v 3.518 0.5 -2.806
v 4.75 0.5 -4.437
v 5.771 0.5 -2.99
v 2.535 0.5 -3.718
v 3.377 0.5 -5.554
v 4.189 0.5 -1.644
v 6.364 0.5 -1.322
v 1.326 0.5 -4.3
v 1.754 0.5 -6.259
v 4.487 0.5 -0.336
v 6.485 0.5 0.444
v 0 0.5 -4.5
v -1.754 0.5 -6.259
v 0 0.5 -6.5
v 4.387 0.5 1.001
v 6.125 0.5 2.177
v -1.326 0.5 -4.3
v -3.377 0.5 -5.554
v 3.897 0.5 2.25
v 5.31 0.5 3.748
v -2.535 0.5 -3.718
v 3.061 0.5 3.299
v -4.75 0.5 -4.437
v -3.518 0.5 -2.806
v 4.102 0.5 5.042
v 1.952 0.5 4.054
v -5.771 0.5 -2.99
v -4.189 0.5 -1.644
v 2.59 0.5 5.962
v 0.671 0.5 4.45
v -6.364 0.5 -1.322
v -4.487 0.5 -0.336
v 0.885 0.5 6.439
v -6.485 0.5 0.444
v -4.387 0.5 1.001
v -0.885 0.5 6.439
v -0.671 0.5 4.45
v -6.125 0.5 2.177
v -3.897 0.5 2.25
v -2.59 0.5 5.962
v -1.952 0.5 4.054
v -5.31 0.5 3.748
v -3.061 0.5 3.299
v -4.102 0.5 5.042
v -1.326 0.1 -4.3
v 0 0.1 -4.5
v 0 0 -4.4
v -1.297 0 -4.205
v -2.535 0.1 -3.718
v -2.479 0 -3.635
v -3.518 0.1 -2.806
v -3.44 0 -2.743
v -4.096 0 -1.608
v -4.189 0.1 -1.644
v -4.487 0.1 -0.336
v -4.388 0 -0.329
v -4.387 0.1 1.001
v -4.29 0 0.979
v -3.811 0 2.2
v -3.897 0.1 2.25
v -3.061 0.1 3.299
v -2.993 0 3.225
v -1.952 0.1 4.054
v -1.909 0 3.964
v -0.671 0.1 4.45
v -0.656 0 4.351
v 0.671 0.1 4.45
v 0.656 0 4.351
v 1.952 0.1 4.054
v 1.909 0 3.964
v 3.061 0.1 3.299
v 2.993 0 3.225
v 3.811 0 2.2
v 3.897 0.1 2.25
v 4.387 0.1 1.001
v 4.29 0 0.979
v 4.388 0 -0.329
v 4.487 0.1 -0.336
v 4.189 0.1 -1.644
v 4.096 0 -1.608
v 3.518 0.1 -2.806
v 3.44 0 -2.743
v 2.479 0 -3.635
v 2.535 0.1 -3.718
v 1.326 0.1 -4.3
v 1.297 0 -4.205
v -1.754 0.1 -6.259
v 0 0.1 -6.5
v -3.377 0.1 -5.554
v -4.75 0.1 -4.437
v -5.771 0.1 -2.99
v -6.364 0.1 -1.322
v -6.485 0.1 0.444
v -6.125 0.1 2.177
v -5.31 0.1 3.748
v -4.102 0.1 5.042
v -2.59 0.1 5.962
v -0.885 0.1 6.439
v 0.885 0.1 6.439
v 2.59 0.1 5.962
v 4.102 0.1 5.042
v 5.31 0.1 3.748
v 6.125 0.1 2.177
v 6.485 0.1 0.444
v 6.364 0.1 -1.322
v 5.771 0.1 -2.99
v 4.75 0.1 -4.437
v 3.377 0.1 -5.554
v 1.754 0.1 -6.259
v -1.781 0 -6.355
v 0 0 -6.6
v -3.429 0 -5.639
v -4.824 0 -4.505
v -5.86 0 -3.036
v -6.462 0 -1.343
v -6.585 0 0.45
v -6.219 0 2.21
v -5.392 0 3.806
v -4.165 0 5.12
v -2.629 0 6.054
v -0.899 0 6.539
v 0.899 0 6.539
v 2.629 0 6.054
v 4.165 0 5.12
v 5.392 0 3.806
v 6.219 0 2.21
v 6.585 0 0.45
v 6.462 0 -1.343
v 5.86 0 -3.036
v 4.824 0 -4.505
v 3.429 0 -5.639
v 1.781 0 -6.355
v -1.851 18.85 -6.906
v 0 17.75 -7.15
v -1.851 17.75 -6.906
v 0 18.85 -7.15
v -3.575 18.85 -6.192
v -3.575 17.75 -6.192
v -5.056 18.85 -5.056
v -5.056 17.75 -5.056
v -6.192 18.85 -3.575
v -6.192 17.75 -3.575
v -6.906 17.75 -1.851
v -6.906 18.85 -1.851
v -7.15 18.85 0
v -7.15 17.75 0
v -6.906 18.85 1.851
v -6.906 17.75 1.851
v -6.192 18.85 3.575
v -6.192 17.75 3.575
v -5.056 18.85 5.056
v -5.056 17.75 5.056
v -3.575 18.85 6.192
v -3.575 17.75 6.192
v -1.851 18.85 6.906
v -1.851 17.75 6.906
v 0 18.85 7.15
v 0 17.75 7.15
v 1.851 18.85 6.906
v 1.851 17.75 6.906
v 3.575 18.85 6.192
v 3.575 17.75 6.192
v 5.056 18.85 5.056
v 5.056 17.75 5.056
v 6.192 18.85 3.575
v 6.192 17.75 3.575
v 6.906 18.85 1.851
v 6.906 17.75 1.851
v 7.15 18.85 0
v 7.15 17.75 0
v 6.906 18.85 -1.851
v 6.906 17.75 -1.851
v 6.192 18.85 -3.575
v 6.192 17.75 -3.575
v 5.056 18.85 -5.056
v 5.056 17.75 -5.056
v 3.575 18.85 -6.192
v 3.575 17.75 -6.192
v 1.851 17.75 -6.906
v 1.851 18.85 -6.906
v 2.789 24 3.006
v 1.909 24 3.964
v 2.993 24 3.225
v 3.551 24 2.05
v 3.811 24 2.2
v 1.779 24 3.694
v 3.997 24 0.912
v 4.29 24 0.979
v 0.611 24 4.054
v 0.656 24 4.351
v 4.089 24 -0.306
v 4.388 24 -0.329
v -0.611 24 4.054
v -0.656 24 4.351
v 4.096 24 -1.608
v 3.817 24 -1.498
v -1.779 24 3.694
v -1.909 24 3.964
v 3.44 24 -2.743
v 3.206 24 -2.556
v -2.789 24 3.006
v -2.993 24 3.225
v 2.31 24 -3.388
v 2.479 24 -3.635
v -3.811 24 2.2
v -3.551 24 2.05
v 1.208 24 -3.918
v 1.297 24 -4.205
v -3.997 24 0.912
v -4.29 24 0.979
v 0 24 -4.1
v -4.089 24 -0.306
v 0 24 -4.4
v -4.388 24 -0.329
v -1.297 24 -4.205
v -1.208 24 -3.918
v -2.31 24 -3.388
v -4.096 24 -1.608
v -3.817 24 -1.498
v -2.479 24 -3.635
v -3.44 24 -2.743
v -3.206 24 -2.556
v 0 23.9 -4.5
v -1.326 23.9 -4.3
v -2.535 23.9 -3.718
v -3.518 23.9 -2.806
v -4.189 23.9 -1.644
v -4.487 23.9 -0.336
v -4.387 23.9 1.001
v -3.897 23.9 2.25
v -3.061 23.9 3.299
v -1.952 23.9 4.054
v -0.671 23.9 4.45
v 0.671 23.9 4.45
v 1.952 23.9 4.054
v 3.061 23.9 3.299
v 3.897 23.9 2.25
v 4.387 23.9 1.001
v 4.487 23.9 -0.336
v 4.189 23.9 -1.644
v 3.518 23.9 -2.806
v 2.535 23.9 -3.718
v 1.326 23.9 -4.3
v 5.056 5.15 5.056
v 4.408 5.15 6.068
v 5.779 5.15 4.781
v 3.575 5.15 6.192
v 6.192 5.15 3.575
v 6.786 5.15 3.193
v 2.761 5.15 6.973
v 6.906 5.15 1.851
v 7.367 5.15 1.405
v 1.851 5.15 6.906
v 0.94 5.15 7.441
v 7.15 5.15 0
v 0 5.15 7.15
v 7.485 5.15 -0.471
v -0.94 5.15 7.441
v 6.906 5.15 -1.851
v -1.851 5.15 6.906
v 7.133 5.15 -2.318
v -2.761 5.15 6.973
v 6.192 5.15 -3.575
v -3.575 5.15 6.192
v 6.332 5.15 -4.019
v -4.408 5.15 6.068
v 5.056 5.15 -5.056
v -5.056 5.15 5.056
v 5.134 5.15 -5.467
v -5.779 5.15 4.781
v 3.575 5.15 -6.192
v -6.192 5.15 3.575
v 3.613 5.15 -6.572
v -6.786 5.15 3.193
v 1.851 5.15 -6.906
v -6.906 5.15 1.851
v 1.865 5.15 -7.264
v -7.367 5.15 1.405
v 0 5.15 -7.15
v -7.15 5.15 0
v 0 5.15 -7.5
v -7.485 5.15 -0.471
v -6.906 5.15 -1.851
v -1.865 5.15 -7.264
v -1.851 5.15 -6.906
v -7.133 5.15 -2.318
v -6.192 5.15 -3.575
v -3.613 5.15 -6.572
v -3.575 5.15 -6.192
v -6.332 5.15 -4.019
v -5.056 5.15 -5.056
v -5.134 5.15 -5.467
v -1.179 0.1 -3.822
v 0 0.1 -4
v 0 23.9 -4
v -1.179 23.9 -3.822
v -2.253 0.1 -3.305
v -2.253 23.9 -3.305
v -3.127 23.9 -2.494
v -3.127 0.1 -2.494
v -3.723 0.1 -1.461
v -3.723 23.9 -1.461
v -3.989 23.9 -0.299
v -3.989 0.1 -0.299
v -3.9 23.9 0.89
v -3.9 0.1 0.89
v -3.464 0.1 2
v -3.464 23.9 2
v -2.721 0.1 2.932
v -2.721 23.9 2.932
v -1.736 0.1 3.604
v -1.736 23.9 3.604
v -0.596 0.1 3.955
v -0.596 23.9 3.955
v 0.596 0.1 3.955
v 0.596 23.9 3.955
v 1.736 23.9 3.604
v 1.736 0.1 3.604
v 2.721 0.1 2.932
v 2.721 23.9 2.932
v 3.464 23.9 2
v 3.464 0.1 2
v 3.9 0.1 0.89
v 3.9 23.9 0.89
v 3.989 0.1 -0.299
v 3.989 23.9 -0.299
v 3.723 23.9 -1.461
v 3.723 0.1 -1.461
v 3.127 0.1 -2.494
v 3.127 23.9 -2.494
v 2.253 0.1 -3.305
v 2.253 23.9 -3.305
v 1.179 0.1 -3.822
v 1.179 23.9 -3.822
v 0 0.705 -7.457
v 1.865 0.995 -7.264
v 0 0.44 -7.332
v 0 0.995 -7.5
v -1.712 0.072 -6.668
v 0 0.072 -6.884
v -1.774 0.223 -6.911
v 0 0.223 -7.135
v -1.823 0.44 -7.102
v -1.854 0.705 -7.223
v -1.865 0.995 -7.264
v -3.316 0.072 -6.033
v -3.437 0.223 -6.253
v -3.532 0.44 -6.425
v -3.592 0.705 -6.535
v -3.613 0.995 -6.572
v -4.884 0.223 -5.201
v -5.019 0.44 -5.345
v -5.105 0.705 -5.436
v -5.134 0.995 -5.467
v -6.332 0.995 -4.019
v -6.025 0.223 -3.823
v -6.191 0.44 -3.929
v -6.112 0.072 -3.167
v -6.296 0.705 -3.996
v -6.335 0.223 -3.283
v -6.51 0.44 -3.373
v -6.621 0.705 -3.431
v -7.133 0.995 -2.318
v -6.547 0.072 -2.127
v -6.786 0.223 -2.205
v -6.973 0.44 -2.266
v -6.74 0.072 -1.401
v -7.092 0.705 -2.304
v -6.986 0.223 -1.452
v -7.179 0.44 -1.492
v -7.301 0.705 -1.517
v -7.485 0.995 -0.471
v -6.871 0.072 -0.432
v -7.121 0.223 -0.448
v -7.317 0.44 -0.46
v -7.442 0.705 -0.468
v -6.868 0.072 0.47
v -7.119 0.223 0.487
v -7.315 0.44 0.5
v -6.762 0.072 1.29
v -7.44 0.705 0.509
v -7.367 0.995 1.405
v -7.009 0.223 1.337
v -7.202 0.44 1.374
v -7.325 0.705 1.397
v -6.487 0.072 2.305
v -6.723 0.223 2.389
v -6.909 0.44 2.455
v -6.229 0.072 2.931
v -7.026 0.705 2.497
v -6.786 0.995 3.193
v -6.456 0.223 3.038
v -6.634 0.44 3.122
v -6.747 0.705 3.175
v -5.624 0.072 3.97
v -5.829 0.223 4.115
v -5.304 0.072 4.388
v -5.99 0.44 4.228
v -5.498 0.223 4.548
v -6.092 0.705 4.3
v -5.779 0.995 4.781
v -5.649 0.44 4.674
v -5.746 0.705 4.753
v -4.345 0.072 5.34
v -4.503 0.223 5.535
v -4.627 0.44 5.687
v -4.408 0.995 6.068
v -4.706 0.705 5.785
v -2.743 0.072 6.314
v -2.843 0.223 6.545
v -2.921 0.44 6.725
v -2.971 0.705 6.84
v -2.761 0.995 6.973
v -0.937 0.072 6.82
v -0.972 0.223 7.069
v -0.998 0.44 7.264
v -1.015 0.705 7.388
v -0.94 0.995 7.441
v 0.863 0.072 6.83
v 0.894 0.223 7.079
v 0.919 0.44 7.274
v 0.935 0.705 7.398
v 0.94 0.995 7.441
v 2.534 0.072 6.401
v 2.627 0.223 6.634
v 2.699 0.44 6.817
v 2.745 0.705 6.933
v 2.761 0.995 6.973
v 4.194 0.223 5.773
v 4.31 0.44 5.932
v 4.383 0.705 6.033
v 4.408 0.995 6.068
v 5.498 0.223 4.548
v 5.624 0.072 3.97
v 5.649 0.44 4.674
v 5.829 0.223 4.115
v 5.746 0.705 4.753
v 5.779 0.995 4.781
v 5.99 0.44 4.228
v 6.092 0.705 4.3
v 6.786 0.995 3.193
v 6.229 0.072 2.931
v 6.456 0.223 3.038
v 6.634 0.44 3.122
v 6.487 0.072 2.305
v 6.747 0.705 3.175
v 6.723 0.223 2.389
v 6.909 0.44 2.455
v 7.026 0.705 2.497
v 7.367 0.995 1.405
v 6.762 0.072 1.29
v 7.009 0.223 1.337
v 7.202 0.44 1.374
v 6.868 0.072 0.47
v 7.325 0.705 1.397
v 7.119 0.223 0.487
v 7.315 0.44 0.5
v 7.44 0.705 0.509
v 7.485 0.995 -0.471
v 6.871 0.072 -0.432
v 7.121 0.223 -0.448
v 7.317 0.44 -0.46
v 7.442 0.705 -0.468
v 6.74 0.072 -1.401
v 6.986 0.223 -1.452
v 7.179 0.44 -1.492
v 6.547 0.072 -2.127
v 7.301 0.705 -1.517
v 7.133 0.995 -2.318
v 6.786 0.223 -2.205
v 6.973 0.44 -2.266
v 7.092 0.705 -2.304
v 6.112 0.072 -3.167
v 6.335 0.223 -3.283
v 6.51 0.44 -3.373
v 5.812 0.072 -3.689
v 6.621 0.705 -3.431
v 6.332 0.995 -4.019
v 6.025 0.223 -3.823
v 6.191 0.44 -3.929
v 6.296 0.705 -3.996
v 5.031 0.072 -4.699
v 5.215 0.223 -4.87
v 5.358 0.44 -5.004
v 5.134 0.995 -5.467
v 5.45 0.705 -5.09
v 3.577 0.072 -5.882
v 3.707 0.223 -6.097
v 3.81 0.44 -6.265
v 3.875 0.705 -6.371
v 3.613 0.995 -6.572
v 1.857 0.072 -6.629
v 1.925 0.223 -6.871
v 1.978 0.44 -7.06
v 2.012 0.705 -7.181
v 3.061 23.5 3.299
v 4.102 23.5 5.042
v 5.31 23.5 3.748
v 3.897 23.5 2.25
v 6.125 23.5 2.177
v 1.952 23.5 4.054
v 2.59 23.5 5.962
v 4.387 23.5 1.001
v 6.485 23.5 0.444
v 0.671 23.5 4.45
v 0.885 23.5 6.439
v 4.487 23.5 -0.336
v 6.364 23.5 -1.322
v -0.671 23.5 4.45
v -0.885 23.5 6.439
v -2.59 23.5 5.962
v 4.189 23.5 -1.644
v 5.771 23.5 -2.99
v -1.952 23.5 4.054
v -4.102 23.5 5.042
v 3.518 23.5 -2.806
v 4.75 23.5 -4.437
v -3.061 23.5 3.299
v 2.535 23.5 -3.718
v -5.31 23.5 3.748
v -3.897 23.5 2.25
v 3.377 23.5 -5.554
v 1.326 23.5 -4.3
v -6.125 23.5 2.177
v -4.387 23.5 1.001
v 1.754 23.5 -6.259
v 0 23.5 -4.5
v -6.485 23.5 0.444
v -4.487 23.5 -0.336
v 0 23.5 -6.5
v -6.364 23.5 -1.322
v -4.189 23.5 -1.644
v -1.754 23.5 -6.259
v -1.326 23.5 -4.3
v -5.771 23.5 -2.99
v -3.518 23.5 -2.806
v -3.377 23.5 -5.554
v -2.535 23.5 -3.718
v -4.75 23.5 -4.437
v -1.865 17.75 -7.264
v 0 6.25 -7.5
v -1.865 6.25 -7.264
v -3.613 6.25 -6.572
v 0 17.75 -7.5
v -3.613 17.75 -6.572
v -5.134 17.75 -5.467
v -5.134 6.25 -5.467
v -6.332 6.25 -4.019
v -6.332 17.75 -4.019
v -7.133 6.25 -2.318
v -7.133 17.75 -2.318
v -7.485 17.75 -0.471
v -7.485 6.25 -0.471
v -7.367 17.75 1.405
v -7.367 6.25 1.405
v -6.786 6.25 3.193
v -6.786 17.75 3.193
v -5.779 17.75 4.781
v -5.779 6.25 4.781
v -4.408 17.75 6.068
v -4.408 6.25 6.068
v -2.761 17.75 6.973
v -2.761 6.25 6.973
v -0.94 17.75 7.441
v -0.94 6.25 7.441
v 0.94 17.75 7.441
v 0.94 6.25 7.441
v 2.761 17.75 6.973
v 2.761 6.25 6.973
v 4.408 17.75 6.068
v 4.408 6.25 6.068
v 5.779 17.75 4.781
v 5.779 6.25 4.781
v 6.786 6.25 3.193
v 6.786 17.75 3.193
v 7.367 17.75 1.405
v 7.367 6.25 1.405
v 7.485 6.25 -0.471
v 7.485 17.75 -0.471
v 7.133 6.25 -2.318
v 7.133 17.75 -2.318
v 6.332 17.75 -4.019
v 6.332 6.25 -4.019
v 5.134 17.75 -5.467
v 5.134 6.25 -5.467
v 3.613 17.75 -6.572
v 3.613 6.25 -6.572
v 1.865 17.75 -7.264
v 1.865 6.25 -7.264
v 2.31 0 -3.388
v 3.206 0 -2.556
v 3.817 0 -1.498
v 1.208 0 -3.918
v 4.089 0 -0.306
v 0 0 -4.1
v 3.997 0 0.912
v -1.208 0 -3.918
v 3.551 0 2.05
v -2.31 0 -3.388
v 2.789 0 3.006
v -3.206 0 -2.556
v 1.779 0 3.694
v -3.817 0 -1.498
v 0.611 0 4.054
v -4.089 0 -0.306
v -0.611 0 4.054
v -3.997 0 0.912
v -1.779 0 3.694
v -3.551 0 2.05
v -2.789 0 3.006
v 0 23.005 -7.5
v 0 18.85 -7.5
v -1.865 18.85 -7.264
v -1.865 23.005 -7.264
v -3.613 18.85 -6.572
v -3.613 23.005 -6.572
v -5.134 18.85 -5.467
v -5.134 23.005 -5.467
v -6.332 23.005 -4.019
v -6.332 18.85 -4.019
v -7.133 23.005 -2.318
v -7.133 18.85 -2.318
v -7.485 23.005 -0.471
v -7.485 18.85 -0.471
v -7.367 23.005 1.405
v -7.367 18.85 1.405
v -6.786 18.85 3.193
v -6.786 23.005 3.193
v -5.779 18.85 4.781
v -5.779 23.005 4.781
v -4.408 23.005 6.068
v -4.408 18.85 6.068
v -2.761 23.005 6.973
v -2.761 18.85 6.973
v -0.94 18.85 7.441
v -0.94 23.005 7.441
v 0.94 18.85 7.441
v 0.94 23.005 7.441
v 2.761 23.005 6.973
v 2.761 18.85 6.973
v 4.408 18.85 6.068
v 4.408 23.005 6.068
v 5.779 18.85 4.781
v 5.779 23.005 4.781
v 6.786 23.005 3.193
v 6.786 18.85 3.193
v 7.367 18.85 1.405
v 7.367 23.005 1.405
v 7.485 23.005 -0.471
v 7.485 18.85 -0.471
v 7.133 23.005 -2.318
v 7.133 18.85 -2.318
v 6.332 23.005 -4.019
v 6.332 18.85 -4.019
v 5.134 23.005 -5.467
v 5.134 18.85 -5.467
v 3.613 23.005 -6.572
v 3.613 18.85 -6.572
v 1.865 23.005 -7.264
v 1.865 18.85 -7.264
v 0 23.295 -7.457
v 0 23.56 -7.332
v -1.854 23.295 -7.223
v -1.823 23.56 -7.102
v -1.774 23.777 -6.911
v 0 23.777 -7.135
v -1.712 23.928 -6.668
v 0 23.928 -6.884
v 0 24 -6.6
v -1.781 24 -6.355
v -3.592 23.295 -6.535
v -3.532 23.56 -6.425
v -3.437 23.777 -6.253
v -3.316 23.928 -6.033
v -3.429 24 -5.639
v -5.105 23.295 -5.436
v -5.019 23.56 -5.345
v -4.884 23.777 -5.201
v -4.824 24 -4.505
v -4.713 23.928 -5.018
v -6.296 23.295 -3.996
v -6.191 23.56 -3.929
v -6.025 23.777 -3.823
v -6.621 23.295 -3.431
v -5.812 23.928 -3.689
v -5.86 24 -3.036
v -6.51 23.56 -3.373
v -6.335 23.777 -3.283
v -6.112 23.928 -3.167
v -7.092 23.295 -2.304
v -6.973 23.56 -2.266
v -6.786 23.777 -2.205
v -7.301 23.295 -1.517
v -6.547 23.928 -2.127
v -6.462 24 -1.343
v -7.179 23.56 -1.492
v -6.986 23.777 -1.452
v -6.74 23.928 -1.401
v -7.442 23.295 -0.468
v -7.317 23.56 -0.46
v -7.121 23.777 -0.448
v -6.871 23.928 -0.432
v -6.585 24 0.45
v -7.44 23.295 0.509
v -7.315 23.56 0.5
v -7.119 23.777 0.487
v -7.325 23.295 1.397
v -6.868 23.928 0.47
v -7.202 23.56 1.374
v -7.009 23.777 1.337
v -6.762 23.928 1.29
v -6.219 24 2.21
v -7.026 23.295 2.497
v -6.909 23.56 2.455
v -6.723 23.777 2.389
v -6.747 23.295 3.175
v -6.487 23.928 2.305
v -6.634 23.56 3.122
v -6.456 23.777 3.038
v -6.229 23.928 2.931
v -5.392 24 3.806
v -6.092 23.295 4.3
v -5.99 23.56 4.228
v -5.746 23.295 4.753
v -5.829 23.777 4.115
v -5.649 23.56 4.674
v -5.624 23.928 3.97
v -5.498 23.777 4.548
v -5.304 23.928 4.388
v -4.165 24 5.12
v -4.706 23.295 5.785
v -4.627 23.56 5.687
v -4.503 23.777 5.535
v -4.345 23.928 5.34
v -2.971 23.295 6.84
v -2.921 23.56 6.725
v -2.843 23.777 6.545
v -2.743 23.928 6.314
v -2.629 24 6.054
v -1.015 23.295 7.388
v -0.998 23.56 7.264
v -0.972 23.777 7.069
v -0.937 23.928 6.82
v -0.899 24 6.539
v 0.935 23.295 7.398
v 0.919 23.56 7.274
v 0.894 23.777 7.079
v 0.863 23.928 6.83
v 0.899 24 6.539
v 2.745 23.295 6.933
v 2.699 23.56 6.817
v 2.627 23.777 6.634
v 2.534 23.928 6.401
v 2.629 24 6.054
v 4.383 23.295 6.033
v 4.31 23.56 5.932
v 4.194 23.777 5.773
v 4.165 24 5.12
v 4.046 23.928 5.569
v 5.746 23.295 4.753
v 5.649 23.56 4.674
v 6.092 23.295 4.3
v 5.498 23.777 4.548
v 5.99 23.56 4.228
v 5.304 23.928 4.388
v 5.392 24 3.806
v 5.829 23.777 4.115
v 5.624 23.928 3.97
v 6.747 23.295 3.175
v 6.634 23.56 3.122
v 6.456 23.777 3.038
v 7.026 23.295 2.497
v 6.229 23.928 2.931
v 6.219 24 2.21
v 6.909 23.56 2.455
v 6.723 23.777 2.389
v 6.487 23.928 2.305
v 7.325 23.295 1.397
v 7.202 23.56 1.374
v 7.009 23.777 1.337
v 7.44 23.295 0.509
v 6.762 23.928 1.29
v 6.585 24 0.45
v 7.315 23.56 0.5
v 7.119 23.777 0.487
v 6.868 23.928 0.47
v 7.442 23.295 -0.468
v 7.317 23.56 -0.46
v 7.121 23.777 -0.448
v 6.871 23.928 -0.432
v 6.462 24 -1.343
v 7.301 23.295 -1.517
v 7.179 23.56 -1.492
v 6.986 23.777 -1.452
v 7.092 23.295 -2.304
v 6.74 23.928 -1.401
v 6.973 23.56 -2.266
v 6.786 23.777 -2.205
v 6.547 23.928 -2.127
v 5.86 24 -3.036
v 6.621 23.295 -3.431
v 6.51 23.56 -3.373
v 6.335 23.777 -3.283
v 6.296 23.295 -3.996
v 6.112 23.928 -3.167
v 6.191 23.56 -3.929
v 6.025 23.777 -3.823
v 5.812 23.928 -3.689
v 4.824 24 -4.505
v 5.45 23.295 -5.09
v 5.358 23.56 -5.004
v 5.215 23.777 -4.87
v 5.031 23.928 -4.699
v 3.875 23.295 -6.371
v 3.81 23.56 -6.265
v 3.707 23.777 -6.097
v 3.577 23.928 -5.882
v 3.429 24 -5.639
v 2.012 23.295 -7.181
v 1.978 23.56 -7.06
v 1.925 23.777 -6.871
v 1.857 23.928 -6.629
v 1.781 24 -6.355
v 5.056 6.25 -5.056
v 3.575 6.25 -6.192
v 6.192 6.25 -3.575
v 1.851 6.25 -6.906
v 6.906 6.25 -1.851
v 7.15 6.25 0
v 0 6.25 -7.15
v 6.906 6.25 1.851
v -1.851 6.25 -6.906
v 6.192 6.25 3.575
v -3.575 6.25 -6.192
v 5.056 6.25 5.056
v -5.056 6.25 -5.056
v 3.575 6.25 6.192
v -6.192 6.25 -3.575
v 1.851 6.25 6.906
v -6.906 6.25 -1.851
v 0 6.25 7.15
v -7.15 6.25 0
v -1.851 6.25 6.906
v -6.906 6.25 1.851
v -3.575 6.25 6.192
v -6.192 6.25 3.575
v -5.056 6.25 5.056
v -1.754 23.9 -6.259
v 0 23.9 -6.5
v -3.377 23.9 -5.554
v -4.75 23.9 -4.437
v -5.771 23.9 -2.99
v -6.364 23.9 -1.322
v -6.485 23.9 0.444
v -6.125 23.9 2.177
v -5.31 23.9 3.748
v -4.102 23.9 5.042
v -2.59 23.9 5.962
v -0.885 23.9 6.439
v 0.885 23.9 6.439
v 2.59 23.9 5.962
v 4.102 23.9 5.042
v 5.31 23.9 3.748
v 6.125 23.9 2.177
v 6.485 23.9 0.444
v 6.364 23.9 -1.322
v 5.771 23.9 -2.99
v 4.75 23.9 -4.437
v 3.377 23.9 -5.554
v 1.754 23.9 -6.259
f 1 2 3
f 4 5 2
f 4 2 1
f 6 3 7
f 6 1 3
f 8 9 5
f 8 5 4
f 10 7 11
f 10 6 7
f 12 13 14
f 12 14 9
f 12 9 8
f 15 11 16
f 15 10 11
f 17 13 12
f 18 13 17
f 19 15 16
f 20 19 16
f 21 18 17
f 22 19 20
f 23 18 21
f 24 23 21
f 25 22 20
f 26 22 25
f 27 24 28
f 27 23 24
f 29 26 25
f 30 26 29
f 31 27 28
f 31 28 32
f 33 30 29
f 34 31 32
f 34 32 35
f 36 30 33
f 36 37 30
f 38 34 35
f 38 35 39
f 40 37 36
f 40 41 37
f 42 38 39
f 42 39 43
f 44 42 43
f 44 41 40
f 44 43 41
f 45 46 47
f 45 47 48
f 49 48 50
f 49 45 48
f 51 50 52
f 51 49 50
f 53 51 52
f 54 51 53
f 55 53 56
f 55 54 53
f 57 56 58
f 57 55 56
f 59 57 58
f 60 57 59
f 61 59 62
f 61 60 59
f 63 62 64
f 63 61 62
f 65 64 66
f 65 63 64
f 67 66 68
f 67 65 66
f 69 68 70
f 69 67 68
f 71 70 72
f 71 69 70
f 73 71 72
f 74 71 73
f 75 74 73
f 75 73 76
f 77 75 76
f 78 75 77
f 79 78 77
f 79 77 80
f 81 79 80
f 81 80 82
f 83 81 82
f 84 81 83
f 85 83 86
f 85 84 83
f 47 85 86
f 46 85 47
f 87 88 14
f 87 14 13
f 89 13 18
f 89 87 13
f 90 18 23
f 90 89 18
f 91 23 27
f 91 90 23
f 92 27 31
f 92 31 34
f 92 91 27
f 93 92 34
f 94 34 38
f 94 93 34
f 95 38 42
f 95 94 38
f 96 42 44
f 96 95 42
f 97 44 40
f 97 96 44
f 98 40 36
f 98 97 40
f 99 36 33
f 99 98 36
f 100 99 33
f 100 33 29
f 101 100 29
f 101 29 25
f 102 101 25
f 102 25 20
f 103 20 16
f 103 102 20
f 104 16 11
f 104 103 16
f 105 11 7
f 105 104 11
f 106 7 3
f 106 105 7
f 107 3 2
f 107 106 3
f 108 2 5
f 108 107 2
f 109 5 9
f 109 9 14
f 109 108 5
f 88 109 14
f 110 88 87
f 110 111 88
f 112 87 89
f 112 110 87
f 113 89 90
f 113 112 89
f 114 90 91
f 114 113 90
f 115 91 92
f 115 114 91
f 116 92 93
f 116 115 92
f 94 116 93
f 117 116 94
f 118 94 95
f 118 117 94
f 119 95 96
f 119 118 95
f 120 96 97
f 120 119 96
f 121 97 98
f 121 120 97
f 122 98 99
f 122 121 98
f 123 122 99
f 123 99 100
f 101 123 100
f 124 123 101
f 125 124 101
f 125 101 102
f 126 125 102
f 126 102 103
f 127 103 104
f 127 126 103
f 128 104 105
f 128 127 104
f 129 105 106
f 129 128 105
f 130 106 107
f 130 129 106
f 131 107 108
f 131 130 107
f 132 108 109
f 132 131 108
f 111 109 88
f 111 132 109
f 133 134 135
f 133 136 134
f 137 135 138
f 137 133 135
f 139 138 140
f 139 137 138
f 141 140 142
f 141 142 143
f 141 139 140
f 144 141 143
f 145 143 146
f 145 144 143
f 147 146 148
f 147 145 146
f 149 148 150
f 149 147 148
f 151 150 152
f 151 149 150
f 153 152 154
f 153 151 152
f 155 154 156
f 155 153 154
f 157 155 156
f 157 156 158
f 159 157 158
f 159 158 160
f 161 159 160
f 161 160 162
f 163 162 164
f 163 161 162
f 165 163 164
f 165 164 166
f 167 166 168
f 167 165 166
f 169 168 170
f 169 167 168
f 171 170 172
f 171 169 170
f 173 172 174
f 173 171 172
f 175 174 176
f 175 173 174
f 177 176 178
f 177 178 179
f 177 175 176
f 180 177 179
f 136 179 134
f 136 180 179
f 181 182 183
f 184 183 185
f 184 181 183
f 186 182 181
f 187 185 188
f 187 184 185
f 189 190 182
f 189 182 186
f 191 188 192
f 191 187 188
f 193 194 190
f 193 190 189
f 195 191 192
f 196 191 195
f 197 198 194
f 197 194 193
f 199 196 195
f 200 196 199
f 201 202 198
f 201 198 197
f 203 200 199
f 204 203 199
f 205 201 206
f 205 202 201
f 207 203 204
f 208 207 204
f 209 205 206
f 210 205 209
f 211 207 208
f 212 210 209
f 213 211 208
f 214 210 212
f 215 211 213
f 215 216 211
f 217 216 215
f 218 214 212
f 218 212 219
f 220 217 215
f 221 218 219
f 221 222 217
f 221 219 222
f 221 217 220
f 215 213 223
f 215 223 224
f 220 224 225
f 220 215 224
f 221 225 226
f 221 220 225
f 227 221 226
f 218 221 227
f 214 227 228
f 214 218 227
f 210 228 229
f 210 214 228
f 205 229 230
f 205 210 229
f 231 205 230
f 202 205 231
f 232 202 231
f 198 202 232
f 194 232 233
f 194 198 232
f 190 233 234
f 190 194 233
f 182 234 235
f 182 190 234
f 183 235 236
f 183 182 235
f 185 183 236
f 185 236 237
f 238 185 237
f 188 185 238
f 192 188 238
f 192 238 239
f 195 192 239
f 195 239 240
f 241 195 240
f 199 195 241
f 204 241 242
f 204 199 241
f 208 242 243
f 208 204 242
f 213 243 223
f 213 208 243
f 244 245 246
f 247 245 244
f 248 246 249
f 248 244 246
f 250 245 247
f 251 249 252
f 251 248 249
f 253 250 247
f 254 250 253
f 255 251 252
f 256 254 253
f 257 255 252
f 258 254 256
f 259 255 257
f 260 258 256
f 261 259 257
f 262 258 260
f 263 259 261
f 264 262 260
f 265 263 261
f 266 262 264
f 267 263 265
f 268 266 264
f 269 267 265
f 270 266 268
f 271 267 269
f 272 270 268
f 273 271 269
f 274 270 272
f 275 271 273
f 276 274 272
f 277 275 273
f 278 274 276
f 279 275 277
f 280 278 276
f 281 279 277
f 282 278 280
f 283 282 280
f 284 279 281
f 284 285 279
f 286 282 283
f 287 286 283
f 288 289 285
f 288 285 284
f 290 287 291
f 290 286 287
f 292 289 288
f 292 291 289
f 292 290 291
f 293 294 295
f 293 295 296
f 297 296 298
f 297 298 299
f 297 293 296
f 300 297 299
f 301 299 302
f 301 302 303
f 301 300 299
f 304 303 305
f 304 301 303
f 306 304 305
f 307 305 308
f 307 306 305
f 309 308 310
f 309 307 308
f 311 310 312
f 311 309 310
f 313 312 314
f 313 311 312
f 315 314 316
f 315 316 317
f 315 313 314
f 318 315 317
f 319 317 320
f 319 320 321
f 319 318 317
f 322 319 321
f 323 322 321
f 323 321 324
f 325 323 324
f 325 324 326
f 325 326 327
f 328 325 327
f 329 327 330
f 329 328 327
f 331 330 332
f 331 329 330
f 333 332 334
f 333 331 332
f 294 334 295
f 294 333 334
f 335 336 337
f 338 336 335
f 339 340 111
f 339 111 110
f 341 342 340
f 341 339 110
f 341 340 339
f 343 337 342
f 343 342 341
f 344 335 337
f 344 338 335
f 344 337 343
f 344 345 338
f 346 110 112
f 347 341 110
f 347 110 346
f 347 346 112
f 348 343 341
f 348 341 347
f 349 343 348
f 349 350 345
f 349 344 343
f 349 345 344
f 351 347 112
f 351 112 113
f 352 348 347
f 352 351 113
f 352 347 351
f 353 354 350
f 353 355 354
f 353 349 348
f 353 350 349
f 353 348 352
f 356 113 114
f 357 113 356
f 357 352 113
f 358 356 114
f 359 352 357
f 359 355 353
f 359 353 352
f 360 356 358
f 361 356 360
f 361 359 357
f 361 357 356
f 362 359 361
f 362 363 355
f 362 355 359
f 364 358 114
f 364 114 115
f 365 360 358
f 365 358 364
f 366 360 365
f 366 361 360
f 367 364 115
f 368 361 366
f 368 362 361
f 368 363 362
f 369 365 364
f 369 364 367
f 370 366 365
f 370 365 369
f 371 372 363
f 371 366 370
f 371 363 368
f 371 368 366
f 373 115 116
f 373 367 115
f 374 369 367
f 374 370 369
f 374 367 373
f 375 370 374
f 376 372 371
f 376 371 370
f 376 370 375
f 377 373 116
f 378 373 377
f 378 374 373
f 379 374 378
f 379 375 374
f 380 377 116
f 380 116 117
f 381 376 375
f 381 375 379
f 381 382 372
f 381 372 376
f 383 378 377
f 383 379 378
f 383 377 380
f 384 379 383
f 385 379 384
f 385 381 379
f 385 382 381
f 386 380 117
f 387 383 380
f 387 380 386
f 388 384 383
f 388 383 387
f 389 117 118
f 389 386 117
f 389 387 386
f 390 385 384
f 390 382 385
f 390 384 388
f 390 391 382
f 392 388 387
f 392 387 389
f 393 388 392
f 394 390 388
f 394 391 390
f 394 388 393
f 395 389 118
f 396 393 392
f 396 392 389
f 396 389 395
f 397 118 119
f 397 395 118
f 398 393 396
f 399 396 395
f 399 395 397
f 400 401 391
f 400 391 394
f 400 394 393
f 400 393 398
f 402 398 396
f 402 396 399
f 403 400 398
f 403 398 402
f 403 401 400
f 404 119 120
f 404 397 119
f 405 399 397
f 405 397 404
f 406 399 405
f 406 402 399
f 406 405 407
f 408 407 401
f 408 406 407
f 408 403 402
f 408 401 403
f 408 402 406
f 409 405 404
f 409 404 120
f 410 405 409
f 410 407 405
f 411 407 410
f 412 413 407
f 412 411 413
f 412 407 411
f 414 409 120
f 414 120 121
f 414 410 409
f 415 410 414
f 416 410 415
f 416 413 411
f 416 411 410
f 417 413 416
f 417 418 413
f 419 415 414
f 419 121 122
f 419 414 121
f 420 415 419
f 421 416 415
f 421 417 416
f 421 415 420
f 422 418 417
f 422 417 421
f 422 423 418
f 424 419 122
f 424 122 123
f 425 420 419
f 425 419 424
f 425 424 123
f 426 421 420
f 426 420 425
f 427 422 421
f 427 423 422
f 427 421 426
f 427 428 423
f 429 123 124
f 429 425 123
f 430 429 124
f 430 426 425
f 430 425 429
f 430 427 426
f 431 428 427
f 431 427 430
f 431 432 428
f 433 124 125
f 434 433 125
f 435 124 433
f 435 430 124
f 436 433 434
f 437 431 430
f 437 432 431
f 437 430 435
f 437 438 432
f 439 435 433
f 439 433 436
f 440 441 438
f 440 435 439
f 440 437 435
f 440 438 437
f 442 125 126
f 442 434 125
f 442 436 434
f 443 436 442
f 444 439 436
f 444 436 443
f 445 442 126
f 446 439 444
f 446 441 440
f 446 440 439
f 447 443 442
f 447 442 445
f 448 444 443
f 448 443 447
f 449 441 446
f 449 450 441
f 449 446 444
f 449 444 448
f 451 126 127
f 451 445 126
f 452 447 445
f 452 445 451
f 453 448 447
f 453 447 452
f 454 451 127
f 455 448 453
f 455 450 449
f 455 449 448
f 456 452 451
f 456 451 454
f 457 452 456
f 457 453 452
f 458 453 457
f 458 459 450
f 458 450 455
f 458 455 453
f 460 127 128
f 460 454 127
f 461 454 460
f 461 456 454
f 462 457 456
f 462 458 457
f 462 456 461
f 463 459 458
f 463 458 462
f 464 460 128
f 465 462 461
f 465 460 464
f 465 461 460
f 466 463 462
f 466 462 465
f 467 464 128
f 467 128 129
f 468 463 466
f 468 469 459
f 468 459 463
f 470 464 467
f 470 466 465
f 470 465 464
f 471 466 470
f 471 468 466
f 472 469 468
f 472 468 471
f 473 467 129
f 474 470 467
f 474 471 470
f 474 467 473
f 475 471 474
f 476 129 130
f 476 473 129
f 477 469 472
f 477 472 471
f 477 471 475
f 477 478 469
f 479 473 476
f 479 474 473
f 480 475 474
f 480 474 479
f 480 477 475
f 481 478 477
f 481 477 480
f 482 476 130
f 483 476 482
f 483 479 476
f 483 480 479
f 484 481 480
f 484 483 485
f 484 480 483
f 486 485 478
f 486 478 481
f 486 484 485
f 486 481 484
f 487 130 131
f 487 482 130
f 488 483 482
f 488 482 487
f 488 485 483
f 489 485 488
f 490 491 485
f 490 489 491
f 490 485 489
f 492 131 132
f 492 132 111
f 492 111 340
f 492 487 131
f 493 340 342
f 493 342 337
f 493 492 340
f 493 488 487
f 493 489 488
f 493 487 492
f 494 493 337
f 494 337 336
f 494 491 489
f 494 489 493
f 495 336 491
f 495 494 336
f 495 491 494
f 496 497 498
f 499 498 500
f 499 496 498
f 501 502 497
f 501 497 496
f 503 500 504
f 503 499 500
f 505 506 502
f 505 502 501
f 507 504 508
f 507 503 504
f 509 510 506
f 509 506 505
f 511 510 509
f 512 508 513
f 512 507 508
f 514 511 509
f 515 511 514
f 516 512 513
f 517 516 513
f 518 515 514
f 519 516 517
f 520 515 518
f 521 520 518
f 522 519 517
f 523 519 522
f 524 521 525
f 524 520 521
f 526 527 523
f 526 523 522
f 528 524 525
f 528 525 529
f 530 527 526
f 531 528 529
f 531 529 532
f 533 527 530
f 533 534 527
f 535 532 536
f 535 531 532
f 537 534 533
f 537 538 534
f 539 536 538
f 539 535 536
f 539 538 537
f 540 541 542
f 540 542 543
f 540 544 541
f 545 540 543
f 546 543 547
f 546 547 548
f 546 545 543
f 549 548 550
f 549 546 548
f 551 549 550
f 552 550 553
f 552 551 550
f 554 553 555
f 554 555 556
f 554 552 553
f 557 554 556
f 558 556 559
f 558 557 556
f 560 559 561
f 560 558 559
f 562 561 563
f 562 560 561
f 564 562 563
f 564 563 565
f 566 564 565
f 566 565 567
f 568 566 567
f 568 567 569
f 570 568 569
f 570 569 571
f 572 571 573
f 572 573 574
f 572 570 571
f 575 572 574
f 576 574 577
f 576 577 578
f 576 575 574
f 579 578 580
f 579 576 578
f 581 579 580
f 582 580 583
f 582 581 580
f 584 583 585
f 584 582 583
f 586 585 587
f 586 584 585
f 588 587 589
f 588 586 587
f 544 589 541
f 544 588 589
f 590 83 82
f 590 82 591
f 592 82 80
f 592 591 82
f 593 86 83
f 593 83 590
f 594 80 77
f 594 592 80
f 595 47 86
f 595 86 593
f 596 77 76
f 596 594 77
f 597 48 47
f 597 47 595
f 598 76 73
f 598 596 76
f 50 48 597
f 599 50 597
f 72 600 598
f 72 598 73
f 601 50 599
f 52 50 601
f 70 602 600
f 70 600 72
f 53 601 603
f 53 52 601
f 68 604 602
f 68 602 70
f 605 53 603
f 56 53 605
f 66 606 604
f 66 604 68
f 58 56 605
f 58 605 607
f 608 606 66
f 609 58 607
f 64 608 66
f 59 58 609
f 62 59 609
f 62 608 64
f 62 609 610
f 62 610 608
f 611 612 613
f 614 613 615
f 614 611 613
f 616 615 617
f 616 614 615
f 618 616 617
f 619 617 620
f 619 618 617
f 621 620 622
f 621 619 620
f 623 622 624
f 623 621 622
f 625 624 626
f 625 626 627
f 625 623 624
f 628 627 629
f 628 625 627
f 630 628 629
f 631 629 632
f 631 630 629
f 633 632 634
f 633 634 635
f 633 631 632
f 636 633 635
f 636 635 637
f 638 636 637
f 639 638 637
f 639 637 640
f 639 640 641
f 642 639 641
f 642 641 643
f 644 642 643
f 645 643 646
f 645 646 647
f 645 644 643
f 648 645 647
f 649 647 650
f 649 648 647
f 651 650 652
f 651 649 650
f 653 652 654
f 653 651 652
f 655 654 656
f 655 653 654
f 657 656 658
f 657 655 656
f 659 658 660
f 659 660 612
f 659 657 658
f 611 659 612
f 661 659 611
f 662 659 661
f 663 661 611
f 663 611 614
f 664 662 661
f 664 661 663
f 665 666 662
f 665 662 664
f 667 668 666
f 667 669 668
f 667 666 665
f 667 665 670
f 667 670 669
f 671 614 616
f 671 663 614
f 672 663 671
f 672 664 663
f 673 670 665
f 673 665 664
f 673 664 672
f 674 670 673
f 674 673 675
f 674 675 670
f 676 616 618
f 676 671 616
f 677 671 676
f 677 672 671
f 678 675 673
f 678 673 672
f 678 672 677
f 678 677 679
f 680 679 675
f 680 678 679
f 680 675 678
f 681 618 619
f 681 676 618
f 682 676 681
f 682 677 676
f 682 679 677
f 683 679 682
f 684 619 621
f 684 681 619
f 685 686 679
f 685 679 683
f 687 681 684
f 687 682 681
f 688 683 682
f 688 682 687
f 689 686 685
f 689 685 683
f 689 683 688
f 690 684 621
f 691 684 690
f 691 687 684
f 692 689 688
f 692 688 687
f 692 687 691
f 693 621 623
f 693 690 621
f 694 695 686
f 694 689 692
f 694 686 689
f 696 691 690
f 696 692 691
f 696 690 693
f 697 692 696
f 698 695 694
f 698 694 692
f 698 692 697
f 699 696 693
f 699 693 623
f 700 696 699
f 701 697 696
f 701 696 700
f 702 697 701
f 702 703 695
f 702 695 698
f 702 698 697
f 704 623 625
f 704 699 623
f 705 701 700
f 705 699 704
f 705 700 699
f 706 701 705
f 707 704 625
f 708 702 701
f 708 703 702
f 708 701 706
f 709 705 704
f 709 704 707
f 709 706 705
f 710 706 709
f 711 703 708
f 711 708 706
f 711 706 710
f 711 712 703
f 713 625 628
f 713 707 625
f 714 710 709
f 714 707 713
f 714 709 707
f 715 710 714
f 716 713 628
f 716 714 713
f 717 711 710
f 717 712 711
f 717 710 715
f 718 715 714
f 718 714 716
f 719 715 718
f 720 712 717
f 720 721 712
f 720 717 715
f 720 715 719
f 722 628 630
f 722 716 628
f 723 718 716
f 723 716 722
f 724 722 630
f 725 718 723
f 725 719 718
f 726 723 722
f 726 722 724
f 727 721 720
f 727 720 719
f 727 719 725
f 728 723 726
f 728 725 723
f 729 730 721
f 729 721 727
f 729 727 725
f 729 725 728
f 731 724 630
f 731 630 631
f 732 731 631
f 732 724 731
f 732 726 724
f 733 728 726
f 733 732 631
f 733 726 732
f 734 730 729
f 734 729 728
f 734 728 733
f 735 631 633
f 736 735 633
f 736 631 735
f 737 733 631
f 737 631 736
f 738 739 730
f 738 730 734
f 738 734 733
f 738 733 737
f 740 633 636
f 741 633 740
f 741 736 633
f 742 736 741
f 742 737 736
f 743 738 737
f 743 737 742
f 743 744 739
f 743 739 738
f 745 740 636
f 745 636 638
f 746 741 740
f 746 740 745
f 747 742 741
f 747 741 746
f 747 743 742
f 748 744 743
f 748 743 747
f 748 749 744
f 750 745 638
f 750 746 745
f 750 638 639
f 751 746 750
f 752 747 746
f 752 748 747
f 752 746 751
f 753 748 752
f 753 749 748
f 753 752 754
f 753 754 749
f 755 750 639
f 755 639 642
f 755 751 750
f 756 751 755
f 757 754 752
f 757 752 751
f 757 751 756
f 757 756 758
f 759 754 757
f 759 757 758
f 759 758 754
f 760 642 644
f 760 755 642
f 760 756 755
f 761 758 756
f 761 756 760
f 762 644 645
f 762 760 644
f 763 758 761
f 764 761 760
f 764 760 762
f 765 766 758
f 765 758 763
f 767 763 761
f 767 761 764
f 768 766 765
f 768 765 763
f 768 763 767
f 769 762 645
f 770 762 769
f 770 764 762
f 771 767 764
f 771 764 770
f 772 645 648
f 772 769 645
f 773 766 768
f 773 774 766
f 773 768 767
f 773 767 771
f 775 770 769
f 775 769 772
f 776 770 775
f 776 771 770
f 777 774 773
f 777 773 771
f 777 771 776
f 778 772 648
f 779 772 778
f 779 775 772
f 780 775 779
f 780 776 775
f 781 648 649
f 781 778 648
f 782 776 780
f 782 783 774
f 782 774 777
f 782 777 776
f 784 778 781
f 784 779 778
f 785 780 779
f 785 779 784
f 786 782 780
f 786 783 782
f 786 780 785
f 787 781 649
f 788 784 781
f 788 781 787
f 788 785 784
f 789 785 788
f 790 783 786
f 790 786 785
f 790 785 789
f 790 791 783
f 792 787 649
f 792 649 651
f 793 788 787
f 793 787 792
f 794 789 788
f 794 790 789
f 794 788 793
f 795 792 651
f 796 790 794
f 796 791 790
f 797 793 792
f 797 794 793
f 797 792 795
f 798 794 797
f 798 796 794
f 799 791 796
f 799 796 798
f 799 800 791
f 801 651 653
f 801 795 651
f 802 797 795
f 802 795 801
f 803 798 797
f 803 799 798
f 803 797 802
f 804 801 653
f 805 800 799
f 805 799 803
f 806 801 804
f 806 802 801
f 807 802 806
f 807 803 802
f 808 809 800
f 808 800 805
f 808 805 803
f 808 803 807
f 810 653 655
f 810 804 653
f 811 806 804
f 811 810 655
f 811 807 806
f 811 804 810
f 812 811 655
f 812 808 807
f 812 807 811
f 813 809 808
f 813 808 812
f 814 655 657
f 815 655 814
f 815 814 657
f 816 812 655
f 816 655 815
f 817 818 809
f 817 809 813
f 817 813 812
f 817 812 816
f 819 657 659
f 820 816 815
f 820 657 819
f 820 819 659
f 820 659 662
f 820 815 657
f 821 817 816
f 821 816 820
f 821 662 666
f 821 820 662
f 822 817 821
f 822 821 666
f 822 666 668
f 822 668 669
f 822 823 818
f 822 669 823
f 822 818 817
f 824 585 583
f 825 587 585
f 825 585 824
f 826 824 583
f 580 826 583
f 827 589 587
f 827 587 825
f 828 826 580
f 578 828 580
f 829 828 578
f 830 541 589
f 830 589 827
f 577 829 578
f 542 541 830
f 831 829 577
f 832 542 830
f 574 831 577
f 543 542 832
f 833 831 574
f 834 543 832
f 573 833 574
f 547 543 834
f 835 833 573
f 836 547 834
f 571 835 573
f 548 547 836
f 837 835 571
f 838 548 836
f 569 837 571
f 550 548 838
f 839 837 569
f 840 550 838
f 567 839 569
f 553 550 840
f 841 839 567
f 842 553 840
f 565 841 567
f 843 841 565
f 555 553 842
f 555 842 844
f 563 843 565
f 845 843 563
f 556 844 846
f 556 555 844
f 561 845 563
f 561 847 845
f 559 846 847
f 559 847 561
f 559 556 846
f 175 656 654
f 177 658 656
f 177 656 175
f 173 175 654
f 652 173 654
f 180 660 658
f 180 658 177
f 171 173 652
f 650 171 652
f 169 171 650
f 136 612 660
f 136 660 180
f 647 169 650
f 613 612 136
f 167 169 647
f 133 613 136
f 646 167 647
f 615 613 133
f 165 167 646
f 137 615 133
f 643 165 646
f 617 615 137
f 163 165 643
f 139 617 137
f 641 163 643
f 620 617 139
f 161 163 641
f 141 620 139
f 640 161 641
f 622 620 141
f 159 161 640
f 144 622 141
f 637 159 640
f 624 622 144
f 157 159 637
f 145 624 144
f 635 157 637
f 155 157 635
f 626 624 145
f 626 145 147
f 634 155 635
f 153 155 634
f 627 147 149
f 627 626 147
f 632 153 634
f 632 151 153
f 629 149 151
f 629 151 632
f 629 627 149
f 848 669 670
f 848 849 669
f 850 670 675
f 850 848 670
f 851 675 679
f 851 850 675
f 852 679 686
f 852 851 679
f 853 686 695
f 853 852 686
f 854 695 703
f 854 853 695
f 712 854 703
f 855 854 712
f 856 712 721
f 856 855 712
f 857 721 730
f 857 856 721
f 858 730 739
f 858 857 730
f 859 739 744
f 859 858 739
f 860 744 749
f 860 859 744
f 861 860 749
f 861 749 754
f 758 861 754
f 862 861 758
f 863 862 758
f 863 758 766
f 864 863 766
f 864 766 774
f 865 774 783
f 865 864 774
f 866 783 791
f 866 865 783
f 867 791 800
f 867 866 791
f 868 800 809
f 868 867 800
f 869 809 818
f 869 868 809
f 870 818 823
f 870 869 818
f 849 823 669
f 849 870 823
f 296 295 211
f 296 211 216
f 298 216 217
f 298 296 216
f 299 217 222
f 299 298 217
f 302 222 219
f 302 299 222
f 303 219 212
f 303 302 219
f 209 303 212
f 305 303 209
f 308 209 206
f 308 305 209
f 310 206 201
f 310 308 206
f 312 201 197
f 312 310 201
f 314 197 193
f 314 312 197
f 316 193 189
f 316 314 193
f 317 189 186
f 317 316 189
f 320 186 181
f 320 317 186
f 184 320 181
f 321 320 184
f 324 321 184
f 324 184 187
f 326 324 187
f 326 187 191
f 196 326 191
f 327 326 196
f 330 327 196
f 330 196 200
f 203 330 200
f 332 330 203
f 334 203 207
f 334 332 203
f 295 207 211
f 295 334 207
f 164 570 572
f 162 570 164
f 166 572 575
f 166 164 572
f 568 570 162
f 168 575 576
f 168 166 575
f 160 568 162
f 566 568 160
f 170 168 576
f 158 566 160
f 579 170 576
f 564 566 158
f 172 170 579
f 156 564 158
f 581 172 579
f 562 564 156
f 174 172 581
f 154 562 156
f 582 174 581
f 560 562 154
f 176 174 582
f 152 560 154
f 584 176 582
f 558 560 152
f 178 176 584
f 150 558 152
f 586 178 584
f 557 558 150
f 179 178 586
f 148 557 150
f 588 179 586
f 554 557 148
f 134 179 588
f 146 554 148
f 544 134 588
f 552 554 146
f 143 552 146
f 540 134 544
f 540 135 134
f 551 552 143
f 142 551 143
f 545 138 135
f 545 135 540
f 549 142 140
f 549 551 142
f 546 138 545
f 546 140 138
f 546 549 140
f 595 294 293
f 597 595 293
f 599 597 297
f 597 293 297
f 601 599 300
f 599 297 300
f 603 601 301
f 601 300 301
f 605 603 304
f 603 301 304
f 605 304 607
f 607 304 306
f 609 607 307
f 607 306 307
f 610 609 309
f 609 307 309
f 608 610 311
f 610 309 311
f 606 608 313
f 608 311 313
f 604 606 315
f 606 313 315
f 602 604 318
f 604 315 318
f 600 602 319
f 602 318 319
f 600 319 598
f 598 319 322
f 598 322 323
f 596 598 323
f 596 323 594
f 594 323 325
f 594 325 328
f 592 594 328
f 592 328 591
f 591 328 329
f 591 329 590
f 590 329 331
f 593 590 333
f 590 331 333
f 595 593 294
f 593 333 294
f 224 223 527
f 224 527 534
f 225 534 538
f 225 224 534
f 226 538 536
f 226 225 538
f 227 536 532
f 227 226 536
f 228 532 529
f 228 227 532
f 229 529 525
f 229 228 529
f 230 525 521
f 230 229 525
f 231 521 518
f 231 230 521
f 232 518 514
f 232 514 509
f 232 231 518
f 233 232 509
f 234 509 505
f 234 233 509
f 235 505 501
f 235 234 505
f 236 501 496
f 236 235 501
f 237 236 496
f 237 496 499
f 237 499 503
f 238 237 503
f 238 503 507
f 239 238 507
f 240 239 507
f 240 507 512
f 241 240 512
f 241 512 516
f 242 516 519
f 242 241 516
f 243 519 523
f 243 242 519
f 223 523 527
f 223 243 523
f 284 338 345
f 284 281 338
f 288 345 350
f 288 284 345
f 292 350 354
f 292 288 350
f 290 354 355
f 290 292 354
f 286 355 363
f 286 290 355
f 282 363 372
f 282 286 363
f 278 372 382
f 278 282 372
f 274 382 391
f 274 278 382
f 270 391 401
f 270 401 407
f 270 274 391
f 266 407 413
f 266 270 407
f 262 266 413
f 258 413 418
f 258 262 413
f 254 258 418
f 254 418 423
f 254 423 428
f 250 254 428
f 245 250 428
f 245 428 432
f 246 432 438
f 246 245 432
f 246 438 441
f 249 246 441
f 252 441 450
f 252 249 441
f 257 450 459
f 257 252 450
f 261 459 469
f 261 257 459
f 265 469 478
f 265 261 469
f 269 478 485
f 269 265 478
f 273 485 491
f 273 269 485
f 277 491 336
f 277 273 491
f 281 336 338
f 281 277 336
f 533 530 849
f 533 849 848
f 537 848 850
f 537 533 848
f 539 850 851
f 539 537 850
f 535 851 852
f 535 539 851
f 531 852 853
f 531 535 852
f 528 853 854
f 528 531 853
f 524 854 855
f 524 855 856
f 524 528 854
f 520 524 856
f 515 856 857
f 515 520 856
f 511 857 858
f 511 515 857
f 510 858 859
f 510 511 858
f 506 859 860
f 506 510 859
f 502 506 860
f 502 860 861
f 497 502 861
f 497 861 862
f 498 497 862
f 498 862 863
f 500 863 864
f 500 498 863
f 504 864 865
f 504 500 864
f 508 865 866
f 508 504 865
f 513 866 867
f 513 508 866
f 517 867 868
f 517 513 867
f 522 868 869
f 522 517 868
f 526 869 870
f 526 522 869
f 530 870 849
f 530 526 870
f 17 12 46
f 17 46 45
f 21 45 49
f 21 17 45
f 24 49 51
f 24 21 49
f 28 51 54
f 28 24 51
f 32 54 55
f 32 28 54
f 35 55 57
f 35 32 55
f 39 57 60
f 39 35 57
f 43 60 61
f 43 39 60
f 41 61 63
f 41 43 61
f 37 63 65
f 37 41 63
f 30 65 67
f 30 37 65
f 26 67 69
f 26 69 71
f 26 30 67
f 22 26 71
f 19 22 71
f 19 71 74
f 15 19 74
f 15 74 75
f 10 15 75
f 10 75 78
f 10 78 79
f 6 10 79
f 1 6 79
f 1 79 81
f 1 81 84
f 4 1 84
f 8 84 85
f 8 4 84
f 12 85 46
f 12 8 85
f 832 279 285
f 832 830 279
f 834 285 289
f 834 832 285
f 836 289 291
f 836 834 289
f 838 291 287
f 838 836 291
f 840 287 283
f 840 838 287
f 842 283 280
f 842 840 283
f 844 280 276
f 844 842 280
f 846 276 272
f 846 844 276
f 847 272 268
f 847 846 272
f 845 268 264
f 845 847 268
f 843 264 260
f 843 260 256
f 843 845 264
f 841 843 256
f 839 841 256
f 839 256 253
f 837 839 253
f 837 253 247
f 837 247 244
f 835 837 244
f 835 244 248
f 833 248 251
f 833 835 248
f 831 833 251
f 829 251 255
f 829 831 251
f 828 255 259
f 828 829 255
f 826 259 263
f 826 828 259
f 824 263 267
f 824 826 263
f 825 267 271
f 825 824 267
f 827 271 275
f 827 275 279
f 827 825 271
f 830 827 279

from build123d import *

# Parameters (mm, degrees)
CHAMFER1_SIZE = 0.1
FILLET1_R     = 1


with BuildPart() as part:
    # Sketch1 → Revolve1 (revolve)
    with BuildSketch(Plane.XY, mode=Mode.PRIVATE) as revolve1_sk:
        Polygon((4, 0), (4.5, 0), (4.5, 0.5), (6.5, 0.5), (6.5, 0), (7.5, 0), (7.5, 5.15), (7.15, 5.15), (7.15, 6.25), (7.5, 6.25), (7.5, 17.75), (7.15, 17.75), (7.15, 18.85), (7.5, 18.85), (7.5, 24), (6.5, 24), (6.5, 23.5), (4.5, 23.5), (4.5, 24), (4, 24), align=None)
    revolve(revolve1_sk.sketch.rotate(Axis((0, 0, 0), (0, 1, 0)), 90), axis=Axis((0, 0, 0), (0, 1, 0)))

    # Chamfer1
    chamfer1_edges = [part.edges().sort_by_distance(p)[0] for p in [
        (0, 0, 4),
        (0, 0, 4.5),
        (0, 0, 6.5),
        (0, 24, 6.5),
        (0, 24, 4.5),
        (0, 24, 4),
    ]]
    chamfer(chamfer1_edges, length=CHAMFER1_SIZE)

    # Fillet1
    # the kernel refuses this fillet: 1 mm, written as the material it takes off along each edge
    with BuildSketch(Plane(origin=(0, 0, 0), x_dir=(0, 0, -1), z_dir=(1, 0, 0))) as fillet1_piece_1:
        with BuildLine():
            CenterArc((6.5, 0.994987437), FILLET1_R, 275.739170477, 84.260829523)
            Line((7.5, 0.994987437), (7.52, 0.994987437))
            Line((7.52, 0.994987437), (7.52, 0))
            Line((7.52, 0), (7.5, -0.02))
            ThreePointArc((7.5, -0.02), (7.05, -0.02), (6.602, -0.019899749))
            Line((6.602, -0.019899749), (6.6, 0))
        make_face()
    revolve(axis=Axis((0, 0, 0), (0, 1, 0)), mode=Mode.SUBTRACT)
    with BuildSketch(Plane(origin=(0, 24, 0), x_dir=(0, 0, -1), z_dir=(1, 0, 0))) as fillet1_piece_2:
        with BuildLine():
            CenterArc((6.5, -0.994987437), FILLET1_R, 0, 84.260829523)
            Line((7.5, -0.994987437), (7.52, -0.994987437))
            Line((7.52, -0.994987437), (7.52, 0))
            Line((7.52, 0), (7.5, 0.02))
            ThreePointArc((7.5, 0.02), (7.05, 0.02), (6.602, 0.019899749))
            Line((6.602, 0.019899749), (6.6, 0))
        make_face()
    revolve(axis=Axis((0, 24, 0), (0, 1, 0)), mode=Mode.SUBTRACT)


solid = part.part
